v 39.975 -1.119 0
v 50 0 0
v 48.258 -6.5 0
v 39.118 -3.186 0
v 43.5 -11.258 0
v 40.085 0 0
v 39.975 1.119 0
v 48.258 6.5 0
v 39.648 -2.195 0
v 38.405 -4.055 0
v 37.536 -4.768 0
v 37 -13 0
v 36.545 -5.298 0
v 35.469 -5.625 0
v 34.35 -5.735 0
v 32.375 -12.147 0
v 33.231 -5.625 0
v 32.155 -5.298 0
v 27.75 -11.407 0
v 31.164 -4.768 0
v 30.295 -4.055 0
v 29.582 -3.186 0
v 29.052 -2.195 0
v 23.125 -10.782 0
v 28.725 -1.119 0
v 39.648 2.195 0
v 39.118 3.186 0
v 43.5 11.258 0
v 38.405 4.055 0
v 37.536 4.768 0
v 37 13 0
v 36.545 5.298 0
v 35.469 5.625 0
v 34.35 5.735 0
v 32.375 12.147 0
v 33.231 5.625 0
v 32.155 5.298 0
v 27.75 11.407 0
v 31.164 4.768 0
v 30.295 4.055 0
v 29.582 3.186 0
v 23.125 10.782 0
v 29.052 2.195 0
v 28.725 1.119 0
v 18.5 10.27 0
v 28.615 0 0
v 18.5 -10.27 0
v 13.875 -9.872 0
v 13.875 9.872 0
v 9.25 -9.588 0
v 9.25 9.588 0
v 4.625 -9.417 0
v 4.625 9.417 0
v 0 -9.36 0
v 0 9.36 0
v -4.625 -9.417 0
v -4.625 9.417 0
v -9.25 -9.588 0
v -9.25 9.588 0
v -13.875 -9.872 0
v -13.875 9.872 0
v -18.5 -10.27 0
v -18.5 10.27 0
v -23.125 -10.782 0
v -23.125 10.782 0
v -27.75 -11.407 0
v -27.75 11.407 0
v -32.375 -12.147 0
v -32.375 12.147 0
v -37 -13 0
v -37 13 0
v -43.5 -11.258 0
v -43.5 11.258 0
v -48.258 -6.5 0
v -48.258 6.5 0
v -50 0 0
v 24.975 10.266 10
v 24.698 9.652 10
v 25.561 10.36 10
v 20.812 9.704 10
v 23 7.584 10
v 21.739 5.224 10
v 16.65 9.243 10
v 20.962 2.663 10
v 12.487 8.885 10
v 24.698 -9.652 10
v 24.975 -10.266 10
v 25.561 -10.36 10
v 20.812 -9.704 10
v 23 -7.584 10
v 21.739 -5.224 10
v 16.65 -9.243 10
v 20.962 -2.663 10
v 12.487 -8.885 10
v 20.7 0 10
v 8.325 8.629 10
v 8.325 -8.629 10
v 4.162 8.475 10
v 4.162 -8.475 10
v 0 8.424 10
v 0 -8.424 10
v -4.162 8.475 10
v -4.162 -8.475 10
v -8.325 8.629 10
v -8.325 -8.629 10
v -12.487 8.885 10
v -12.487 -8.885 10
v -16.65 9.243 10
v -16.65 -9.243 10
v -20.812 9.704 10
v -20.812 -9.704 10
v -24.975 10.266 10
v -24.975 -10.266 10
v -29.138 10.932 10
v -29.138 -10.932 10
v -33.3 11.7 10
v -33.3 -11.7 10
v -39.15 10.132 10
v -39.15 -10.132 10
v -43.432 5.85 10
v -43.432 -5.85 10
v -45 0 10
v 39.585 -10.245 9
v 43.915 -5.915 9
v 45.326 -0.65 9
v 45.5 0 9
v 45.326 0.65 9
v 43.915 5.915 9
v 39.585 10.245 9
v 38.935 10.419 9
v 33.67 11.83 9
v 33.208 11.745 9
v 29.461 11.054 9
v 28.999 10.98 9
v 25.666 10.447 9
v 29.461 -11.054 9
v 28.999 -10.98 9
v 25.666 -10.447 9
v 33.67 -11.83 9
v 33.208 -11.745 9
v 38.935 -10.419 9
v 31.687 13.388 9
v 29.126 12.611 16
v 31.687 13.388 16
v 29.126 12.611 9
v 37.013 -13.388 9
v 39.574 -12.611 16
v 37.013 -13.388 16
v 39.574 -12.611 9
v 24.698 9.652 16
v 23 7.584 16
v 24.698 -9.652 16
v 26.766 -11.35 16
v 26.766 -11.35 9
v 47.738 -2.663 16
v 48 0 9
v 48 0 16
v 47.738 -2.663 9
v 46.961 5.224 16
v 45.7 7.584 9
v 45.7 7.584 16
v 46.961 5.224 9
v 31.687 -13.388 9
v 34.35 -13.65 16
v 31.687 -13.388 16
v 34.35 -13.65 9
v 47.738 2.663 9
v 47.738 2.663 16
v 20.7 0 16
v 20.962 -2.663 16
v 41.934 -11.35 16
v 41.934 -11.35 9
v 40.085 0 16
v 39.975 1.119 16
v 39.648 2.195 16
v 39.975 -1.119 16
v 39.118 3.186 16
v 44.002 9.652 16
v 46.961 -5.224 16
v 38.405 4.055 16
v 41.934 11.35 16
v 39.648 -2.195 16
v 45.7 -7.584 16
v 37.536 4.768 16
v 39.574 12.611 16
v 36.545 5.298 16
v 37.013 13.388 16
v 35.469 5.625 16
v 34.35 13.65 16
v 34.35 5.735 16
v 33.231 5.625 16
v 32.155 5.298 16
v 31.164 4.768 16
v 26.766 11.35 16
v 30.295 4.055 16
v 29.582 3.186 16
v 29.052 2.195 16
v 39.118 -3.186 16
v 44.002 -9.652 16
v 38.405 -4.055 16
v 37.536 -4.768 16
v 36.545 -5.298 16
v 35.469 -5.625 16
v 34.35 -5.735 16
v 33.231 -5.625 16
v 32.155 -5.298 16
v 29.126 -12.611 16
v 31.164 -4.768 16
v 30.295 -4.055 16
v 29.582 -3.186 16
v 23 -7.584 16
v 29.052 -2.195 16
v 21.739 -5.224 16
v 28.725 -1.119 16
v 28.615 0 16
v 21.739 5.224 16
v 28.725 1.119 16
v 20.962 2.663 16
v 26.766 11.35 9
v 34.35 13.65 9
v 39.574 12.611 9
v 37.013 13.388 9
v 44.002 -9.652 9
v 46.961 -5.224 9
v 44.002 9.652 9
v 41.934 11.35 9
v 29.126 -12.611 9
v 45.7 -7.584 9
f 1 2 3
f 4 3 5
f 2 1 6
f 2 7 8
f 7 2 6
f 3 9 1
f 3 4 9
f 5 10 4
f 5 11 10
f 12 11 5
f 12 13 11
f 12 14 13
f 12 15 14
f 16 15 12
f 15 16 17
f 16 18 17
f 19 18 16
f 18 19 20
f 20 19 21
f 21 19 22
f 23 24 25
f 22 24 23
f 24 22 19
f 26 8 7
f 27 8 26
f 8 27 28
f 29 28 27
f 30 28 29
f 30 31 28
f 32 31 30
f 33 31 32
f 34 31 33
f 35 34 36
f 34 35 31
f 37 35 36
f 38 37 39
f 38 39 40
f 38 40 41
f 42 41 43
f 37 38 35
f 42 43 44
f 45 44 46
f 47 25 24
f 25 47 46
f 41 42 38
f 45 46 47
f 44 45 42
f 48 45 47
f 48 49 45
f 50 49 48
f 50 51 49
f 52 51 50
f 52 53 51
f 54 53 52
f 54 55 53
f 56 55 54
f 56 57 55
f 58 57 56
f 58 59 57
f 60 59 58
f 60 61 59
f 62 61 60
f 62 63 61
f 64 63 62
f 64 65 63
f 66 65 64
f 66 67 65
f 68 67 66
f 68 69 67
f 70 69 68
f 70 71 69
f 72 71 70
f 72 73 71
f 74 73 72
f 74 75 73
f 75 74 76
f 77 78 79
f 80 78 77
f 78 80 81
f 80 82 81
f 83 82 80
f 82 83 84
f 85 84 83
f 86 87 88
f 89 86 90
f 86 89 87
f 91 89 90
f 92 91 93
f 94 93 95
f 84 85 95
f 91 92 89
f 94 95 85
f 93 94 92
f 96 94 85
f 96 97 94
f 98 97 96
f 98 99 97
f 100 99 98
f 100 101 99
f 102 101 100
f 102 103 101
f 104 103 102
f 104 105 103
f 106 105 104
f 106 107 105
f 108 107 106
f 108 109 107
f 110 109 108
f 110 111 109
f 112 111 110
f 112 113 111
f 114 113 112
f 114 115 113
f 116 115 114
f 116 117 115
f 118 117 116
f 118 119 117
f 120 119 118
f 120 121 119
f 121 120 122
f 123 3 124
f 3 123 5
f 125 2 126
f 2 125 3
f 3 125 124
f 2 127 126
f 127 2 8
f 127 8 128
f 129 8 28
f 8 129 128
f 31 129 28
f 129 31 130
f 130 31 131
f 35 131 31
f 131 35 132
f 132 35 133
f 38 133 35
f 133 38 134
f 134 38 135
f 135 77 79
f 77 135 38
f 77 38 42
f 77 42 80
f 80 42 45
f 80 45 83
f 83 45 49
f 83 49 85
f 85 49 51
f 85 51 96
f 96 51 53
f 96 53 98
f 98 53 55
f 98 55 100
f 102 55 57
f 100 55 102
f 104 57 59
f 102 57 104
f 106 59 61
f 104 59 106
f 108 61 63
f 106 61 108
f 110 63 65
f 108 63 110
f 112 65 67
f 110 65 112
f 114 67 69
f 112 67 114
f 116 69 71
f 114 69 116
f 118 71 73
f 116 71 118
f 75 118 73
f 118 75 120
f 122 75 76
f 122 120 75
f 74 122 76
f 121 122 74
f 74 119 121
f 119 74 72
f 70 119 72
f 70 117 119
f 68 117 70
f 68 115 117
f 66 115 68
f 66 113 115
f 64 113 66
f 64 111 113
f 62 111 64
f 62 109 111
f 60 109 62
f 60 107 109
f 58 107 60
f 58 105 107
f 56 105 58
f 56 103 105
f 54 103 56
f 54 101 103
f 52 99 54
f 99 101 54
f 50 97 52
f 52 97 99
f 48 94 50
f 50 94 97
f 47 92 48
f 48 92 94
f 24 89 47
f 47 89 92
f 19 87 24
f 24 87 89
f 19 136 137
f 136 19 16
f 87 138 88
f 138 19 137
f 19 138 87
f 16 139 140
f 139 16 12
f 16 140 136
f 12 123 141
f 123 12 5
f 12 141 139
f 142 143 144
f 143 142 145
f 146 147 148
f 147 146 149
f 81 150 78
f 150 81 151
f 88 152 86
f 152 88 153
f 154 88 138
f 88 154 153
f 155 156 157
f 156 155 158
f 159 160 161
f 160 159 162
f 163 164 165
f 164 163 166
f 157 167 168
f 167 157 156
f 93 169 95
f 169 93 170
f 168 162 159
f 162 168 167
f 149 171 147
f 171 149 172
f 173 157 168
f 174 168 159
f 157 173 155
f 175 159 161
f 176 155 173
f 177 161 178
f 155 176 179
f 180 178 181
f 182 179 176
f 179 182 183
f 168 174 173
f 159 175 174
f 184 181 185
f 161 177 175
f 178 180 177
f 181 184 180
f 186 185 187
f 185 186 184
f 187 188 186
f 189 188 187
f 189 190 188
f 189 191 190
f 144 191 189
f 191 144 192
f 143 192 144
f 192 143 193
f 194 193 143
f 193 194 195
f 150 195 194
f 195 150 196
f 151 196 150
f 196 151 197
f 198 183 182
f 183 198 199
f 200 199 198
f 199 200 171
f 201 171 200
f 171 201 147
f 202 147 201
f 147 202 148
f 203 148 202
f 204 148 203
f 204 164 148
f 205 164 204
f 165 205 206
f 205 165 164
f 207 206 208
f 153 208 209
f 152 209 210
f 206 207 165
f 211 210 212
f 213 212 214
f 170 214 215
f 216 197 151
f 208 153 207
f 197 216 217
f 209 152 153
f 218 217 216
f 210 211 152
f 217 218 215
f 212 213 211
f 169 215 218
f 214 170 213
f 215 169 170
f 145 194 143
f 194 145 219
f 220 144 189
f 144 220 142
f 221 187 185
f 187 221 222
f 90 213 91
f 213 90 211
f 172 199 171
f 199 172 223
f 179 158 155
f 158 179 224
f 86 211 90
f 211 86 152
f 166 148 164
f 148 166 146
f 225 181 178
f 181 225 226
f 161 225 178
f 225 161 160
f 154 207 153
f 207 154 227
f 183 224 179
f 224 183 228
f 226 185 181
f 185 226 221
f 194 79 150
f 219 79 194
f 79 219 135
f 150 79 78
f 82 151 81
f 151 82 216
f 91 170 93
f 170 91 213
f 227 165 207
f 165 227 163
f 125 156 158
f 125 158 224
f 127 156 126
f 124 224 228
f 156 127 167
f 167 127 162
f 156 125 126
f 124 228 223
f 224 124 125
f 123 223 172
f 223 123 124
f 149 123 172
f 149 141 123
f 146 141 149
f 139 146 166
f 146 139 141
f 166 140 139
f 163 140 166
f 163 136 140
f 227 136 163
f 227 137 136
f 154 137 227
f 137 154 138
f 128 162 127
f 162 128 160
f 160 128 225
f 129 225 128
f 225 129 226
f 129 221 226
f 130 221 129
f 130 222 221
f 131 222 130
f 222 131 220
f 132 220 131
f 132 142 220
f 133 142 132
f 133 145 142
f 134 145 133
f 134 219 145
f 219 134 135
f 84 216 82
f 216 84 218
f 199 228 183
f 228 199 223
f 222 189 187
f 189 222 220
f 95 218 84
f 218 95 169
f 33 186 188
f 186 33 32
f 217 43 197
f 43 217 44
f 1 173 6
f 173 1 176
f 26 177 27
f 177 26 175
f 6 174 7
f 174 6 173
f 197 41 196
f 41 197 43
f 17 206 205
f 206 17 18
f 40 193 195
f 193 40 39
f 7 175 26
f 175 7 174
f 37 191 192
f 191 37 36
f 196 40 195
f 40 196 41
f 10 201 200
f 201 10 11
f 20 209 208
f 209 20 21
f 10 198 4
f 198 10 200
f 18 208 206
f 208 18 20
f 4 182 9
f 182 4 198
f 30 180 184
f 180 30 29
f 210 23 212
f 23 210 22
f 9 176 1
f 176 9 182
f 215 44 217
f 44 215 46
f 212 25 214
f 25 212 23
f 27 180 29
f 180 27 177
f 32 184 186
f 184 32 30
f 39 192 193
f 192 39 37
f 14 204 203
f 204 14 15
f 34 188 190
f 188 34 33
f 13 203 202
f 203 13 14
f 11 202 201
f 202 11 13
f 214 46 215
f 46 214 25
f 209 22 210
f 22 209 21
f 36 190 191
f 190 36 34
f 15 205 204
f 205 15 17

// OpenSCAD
$fn = 32;

// ----------------------------------------------------------------------
// Handle: 100 x 26 mm grip, 10 mm thick
// ----------------------------------------------------------------------

// --- parameters (mm) ---
length = 100;             // grip length
width = 26;               // grip width
thickness = 10;           // grip thickness
waist = 0.72;             // width factor at the middle
draft = 0.9;              // top face scale of the extrusion
boss_d = 27.3;            // mounting boss diameter
boss_h = 6;               // mounting boss height
boss_hole_d = 11.47;      // screw clearance through the boss
boss_r = 34.35;           // boss centre from the grip centre

/* ergonomic grip outline, closed spline-like polygon in the XY plane */
grip = [[-37, 13], [-32.375, 12.147], [-27.75, 11.407], [-23.125, 10.782], [-18.5, 10.27], [-13.875, 9.872], [-9.25, 9.588], [-4.625, 9.417], [0, 9.36], [4.625, 9.417], [9.25, 9.588], [13.875, 9.872], [18.5, 10.27], [23.125, 10.782], [27.75, 11.407], [32.375, 12.147], [37, 13], [43.5, 11.258], [48.258, 6.5], [50, 0], [48.258, -6.5], [43.5, -11.258], [37, -13], [37, -13], [32.375, -12.147], [27.75, -11.407], [23.125, -10.782], [18.5, -10.27], [13.875, -9.872], [9.25, -9.588], [4.625, -9.417], [0, -9.36], [-4.625, -9.417], [-9.25, -9.588], [-13.875, -9.872], [-18.5, -10.27], [-23.125, -10.782], [-27.75, -11.407], [-32.375, -12.147], [-37, -13], [-43.5, -11.258], [-48.258, -6.5], [-50, 0], [-48.258, 6.5], [-43.5, 11.258], [-37, 13]];

module grip_body() {
  linear_extrude(height = thickness, scale = draft) polygon(grip);
}

module boss_body() {
  /* sunk 1 mm into the grip so the joint overlaps */
  translate([boss_r, 0, thickness - 1]) cylinder(h = boss_h + 1, d = boss_d);
}

difference() {
  union() {
    grip_body();
    boss_body();
  }
  translate([boss_r, 0, -1]) cylinder(h = thickness + boss_h + 2, d = boss_hole_d);
}
